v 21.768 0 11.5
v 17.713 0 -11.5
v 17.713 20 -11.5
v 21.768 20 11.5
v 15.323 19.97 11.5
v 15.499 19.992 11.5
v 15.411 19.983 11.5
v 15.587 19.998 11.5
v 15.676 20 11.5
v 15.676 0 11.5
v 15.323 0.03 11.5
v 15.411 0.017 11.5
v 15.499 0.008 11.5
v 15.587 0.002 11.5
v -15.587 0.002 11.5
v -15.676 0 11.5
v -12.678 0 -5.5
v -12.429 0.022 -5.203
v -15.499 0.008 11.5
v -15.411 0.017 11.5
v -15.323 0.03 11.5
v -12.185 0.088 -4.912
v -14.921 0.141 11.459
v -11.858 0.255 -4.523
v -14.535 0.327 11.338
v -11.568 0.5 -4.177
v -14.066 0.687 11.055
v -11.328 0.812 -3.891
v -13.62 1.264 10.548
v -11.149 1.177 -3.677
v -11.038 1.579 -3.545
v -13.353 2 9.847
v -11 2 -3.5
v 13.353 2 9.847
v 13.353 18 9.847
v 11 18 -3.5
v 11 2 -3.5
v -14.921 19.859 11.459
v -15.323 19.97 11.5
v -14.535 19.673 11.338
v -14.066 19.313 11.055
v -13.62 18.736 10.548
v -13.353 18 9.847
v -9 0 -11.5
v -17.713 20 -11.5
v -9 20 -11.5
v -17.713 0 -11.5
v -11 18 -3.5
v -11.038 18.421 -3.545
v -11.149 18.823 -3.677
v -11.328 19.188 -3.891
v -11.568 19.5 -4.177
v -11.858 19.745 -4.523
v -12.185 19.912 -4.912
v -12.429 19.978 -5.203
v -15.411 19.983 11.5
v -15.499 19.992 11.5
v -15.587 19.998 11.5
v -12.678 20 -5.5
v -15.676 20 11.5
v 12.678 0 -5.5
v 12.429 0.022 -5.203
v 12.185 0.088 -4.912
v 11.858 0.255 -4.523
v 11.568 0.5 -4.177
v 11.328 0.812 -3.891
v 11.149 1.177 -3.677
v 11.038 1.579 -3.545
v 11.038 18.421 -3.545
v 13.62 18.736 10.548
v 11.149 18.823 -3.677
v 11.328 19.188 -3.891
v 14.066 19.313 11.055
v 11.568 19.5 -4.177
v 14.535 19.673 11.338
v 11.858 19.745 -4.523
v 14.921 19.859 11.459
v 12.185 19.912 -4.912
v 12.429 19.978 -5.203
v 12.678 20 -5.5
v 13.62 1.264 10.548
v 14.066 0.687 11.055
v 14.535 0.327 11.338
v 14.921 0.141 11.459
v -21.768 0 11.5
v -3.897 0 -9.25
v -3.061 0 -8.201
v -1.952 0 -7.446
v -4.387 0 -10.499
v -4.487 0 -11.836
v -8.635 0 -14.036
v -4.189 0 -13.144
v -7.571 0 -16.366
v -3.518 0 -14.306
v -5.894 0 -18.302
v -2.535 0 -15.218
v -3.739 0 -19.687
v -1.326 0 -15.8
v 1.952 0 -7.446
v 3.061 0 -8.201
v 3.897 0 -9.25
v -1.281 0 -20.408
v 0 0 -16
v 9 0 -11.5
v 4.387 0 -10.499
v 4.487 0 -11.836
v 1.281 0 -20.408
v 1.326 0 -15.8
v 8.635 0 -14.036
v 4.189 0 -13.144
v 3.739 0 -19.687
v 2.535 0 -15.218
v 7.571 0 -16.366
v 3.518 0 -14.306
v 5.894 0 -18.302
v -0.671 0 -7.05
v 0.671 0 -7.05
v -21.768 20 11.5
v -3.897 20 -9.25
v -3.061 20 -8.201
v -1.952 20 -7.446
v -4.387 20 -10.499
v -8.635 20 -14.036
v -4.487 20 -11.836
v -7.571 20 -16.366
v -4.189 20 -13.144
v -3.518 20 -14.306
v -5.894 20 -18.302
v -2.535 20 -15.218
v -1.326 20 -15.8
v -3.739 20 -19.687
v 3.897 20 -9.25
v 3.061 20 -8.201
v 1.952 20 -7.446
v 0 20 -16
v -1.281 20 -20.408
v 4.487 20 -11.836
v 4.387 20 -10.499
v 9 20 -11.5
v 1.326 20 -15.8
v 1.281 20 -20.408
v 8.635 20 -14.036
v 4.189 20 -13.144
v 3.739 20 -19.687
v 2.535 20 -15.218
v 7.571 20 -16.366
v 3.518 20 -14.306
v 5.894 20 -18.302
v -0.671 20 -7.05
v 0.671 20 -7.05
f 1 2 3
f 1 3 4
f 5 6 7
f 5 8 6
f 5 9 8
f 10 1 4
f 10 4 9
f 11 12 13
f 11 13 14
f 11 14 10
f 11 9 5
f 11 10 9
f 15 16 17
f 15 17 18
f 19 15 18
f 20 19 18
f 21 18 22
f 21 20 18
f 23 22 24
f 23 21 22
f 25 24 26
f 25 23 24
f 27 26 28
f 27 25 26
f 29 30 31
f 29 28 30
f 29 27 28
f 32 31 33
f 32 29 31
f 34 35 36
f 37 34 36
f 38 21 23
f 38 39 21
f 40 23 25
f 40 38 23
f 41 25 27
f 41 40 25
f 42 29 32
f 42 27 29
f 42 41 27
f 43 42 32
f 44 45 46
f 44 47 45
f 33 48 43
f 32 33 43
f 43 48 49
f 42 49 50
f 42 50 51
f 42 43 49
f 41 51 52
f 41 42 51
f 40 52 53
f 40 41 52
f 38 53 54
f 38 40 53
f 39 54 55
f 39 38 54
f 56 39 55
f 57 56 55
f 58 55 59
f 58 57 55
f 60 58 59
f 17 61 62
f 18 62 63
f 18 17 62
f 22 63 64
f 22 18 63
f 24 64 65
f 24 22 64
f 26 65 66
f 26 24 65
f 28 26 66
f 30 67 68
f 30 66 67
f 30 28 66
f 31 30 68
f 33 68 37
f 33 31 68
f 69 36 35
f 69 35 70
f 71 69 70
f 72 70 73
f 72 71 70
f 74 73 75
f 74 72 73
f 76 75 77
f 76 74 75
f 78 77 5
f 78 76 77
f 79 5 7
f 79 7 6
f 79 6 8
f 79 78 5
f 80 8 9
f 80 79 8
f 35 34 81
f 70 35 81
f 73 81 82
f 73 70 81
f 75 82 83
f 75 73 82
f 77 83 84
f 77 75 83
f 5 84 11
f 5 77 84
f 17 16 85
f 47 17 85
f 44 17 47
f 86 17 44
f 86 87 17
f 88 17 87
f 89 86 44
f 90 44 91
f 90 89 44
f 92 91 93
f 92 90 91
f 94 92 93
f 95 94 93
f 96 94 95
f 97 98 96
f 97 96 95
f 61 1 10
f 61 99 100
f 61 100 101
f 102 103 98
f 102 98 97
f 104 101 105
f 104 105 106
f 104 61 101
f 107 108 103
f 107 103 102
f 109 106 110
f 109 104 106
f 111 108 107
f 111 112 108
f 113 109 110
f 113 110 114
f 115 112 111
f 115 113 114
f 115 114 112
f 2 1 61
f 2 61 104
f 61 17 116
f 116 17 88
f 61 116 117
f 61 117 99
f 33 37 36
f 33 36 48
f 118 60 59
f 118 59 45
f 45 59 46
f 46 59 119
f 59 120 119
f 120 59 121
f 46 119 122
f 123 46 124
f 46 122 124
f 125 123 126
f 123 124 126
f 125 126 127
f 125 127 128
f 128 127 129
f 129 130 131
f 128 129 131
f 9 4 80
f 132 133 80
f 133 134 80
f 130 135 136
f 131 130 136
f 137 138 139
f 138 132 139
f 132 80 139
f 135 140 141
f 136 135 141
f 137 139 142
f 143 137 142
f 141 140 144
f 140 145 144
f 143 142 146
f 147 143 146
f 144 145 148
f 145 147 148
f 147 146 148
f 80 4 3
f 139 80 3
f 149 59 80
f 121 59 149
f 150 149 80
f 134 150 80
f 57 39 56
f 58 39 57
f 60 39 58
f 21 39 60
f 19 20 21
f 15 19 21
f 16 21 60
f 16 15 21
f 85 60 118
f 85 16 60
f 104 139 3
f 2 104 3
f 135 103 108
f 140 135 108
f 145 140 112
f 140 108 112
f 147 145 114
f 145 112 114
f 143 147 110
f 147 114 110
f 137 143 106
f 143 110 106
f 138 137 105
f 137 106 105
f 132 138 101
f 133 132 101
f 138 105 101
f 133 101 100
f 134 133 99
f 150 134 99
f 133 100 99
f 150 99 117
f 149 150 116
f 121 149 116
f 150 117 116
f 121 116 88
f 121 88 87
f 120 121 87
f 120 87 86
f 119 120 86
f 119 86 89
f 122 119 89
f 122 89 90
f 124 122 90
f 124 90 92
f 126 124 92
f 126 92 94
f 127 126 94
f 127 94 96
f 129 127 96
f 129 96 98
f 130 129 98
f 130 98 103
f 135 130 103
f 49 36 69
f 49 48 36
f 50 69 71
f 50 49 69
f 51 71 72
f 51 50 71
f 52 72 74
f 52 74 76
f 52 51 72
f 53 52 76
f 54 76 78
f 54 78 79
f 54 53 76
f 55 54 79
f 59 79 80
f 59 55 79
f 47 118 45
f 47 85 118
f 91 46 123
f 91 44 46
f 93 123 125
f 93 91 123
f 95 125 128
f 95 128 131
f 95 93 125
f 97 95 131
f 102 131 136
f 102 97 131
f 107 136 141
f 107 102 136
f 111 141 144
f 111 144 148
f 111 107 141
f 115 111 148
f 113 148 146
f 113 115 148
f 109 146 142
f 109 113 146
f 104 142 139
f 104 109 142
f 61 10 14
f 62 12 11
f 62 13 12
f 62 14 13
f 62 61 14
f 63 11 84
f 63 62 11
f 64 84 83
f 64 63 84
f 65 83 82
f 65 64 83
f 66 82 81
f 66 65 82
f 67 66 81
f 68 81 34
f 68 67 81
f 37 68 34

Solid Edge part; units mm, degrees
sketch "Sketch1" plane through (0, 0, 0) normal (0, -1, 0) x (1, 0, 0)
  line L0 (-11, -3.5) -> (-13.6449, 11.5)
  line L1 (-13.6449, 11.5) -> (-21.7683, 11.5)
  line L2 (-21.7683, 11.5) -> (-17.7128, -11.5)
  line L3 (-17.7128, -11.5) -> (17.7128, -11.5)
  line L4 (17.7128, -11.5) -> (21.7683, 11.5)
  line L5 (21.7683, 11.5) -> (13.6449, 11.5)
  line L6 (13.6449, 11.5) -> (11, -3.5)
  line L7 (11, -3.5) -> (-11, -3.5)
extrude "Protrusion1" add sketch "Sketch1" against normal blind 20
sketch "Sketch2" plane through (0, 0, 0) normal (0, -1, 0) x (1, 0, 0)
  arc A0 (-9, -11.5) -> (9, -11.5) centre (0, -11.5) ccw
  line L0 (-9, -11.5) -> (9, -11.5)
extrude "ExtrudedCutout_1" add sketch "Sketch2" against normal blind 20
hole "Trou_pivot" at (0, 0, -11.5) direction (0, 1, 0) diameter 9 end up to next
fillet "Congé_2mm" radius 2 8 edges at (0, 0, -3.5) (-12.3225, 0, 4) (-12.3225, 20, 4) (12.3225, 0, 4) (0, 20, -3.5) (12.3225, 20, 4) (-13.6449, 10, 11.5) (13.6449, 10, 11.5)
properties material "Polyuréthane"
